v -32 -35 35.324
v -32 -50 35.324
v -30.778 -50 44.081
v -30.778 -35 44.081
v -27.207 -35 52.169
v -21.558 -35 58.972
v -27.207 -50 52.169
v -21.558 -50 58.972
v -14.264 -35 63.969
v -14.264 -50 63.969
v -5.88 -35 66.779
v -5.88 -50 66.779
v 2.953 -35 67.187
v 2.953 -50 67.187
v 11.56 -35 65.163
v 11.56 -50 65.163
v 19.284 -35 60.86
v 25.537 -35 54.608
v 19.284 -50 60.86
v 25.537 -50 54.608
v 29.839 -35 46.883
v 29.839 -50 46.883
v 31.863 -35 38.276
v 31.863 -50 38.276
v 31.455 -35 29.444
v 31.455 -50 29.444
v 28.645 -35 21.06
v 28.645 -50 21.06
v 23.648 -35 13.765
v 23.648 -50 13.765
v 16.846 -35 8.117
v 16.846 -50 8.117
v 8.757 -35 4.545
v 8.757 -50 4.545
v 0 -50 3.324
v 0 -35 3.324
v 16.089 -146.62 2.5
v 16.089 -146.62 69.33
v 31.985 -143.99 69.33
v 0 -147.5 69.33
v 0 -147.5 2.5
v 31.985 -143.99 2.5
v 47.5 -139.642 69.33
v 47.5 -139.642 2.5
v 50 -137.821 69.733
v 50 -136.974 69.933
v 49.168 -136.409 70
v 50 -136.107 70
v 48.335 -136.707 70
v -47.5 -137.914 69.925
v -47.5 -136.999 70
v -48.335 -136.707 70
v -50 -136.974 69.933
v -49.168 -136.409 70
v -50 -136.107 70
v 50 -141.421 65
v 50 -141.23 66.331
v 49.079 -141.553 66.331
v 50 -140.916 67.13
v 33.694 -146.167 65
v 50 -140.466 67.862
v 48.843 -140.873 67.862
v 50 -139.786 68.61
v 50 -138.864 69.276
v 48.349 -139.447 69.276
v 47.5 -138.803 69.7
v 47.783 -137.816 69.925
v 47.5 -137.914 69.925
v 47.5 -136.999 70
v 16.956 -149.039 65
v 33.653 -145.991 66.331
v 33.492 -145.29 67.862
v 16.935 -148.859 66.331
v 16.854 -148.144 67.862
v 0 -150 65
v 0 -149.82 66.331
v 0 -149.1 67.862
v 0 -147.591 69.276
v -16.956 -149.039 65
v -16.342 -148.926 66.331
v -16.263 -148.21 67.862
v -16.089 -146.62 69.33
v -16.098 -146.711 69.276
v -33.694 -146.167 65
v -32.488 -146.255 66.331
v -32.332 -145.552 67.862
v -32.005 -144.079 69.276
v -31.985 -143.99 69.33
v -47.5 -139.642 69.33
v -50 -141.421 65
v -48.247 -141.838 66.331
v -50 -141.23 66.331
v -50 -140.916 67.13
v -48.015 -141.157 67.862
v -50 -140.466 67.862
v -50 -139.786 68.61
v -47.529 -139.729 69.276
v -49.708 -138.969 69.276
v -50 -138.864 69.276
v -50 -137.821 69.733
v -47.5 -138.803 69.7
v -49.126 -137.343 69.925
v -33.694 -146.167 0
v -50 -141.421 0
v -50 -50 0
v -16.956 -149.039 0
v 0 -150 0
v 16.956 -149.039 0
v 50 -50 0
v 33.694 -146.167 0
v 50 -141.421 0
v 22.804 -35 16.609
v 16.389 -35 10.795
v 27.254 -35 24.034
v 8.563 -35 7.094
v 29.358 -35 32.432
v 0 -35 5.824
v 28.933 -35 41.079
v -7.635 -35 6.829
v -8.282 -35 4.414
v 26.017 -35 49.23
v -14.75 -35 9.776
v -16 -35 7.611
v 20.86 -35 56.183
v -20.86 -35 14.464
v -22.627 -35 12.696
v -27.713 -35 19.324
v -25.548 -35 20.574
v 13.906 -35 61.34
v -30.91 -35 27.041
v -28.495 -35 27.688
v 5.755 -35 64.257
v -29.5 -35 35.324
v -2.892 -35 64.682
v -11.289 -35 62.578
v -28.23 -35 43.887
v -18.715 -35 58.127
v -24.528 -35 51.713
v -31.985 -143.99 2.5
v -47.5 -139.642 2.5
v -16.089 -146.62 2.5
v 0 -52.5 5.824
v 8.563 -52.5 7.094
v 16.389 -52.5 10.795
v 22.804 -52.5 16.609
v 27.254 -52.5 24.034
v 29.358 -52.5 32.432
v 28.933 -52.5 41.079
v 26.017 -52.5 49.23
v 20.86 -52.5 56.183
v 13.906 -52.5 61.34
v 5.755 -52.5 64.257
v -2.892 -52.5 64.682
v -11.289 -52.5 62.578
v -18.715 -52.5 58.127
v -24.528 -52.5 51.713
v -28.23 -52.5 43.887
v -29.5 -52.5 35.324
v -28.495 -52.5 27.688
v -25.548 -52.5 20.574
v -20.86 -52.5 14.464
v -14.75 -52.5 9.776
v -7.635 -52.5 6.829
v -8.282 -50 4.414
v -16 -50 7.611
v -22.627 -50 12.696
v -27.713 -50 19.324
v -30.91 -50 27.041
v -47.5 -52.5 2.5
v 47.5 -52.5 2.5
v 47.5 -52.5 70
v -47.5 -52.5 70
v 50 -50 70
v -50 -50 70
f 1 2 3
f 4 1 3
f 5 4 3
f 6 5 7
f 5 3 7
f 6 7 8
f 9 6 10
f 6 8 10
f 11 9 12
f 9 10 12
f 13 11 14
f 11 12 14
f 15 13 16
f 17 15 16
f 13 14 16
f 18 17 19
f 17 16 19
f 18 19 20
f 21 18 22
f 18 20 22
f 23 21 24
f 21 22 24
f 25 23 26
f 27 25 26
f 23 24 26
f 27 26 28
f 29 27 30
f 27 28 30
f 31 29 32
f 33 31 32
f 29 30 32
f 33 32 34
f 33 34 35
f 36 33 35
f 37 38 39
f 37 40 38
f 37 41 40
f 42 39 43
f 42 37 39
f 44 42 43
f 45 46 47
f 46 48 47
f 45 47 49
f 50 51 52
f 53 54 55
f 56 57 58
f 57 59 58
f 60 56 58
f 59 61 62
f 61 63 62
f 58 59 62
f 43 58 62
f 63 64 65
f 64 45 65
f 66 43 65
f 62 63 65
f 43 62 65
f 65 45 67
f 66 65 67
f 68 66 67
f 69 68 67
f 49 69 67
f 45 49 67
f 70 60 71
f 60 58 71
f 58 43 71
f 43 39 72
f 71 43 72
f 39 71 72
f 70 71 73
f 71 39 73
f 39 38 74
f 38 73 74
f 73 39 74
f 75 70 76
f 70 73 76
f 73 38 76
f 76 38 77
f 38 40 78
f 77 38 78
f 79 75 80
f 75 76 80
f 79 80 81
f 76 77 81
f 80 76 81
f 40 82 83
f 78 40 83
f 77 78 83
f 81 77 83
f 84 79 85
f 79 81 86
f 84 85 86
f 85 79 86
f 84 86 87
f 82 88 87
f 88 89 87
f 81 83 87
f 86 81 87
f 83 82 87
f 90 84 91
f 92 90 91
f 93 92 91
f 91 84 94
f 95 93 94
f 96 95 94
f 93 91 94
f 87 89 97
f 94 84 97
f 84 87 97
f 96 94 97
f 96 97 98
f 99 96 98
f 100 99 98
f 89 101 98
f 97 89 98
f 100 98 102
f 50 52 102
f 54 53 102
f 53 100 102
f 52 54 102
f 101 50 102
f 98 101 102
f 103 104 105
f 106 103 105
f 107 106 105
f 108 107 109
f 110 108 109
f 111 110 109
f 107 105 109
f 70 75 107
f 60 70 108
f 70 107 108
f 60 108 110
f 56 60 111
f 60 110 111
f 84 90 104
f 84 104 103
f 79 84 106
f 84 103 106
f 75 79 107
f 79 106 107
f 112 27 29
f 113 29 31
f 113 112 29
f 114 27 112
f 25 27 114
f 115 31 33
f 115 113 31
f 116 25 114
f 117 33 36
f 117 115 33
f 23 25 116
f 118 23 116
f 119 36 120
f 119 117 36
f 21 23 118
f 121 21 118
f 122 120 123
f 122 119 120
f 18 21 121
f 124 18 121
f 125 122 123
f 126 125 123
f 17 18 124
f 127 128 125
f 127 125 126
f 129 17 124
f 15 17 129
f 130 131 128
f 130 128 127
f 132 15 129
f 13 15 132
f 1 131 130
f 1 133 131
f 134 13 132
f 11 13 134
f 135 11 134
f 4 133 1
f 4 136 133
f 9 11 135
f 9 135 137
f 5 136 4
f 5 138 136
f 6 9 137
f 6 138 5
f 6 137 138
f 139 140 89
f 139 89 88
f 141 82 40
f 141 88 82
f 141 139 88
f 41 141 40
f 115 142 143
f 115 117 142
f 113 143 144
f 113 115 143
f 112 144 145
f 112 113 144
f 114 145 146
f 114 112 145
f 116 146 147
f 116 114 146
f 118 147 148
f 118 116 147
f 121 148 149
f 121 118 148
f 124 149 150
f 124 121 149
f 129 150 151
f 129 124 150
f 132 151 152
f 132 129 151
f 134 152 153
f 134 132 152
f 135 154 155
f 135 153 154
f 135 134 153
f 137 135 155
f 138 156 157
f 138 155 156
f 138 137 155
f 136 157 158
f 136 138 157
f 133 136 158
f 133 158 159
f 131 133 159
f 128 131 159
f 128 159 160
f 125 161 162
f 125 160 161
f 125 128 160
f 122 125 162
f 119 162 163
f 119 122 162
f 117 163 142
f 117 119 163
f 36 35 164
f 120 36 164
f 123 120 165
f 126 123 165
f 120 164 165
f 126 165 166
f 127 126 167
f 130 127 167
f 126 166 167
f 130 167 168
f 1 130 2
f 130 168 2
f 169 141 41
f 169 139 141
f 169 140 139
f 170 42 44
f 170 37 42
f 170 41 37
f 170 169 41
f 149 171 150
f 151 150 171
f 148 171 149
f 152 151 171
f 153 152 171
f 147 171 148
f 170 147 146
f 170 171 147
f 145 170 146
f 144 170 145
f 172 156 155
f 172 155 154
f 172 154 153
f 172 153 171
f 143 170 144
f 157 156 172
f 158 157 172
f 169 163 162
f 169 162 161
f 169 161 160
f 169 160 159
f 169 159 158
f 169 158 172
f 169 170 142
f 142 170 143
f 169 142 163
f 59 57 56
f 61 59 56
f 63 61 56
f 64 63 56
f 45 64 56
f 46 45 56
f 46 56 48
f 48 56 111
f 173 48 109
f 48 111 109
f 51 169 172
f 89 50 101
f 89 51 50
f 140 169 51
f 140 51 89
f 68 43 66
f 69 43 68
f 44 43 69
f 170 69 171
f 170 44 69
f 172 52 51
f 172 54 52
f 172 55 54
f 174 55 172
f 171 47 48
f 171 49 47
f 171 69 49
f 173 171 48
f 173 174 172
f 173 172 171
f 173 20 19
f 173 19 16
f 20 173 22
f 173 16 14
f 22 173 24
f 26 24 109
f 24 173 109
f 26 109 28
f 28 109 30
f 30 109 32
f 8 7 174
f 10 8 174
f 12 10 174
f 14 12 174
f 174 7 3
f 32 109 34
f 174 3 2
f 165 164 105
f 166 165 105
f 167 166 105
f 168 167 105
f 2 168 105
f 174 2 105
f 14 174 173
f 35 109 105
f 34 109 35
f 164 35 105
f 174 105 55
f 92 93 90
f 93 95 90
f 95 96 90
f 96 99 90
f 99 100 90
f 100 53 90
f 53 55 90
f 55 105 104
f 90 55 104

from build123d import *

# Parameters (mm, degrees)
F1_DEPTH    = 70
F2_T        = -2.5
F3_T2_ANGLE = 48.492455887
F5_DEPTH    = 15
F6_T        = -2.5
F7_DEPTH    = 25


# Not quite as in the source:
# - a fillet or chamfer that OpenCascade refuses, or shapes differently, is made with other operations: its cross-section is extruded or revolved along the edge and cut away or added


with BuildPart() as f1:
    # F0 (on Top) → F1 (new body)
    with BuildSketch(Plane.XY):
        with BuildLine():
            ThreePointArc((-50, -141.4213562373), (-25.3652968089, -147.839783948), (0, -150))
            ThreePointArc((0, -150), (25.3652968089, -147.839783948), (50, -141.4213562373))
            Line((50, -141.4213562373), (50, -50))
            Line((50, -50), (0, -50))
            Line((0, -50), (-50, -50))
            Line((-50, -50), (-50, -141.4213562373))
        make_face()
    extrude(amount=F1_DEPTH)

    # F2
    f2_openings = [f1.faces().sort_by_distance(p)[0] for p in [
        (0, -98.620362, 70),
    ]]
    offset(amount=F2_T, openings=f2_openings)

    # F3: fillet of radius 5 on 1 edges, made by hand

    # F3_s1 → F3_t2 (revolve, cut)
    with BuildSketch(Plane(origin=(0, 0, 0), x_dir=(0, 0, 1), z_dir=(0.9117890812, 0.410658826, 0))):
        with BuildLine():
            ThreePointArc((65, 150), (68.5355339059, 148.5355339059), (70, 145))
            Line((70, 145), (70, 150))
            Line((70, 150), (65, 150))
        make_face()
    revolve(axis=Axis((0, 0, 70), (0, 0, -1)), revolution_arc=F3_T2_ANGLE, mode=Mode.SUBTRACT)

    # F4 (on face) → F5 (join)
    with BuildSketch(Plane(origin=(0, -50, 0), x_dir=(-1, 0, 0), z_dir=(0, 1, 0))):
        with BuildLine():
            ThreePointArc((32, 35.3235527873), (-22.627416998, 57.9509697853), (0, 3.3235527873))
            ThreePointArc((0, 3.3235527873), (22.627416998, 12.6961357893), (32, 35.3235527873))
        make_face()
    extrude(amount=F5_DEPTH)

    # F6
    f6_openings = [f1.faces().sort_by_distance(p)[0] for p in [
        (0, -35, 35.323553),
    ]]
    offset(amount=F6_T, openings=f6_openings, kind=Kind.INTERSECTION)

    # F7 (cut): a face of the model
    f7_faces = [f1.faces().sort_by_distance(p)[0] for p in [
        (0, -50, 35.3235527873),
    ]]
    extrude(f7_faces, amount=-F7_DEPTH, mode=Mode.SUBTRACT)


solid = f1.part
